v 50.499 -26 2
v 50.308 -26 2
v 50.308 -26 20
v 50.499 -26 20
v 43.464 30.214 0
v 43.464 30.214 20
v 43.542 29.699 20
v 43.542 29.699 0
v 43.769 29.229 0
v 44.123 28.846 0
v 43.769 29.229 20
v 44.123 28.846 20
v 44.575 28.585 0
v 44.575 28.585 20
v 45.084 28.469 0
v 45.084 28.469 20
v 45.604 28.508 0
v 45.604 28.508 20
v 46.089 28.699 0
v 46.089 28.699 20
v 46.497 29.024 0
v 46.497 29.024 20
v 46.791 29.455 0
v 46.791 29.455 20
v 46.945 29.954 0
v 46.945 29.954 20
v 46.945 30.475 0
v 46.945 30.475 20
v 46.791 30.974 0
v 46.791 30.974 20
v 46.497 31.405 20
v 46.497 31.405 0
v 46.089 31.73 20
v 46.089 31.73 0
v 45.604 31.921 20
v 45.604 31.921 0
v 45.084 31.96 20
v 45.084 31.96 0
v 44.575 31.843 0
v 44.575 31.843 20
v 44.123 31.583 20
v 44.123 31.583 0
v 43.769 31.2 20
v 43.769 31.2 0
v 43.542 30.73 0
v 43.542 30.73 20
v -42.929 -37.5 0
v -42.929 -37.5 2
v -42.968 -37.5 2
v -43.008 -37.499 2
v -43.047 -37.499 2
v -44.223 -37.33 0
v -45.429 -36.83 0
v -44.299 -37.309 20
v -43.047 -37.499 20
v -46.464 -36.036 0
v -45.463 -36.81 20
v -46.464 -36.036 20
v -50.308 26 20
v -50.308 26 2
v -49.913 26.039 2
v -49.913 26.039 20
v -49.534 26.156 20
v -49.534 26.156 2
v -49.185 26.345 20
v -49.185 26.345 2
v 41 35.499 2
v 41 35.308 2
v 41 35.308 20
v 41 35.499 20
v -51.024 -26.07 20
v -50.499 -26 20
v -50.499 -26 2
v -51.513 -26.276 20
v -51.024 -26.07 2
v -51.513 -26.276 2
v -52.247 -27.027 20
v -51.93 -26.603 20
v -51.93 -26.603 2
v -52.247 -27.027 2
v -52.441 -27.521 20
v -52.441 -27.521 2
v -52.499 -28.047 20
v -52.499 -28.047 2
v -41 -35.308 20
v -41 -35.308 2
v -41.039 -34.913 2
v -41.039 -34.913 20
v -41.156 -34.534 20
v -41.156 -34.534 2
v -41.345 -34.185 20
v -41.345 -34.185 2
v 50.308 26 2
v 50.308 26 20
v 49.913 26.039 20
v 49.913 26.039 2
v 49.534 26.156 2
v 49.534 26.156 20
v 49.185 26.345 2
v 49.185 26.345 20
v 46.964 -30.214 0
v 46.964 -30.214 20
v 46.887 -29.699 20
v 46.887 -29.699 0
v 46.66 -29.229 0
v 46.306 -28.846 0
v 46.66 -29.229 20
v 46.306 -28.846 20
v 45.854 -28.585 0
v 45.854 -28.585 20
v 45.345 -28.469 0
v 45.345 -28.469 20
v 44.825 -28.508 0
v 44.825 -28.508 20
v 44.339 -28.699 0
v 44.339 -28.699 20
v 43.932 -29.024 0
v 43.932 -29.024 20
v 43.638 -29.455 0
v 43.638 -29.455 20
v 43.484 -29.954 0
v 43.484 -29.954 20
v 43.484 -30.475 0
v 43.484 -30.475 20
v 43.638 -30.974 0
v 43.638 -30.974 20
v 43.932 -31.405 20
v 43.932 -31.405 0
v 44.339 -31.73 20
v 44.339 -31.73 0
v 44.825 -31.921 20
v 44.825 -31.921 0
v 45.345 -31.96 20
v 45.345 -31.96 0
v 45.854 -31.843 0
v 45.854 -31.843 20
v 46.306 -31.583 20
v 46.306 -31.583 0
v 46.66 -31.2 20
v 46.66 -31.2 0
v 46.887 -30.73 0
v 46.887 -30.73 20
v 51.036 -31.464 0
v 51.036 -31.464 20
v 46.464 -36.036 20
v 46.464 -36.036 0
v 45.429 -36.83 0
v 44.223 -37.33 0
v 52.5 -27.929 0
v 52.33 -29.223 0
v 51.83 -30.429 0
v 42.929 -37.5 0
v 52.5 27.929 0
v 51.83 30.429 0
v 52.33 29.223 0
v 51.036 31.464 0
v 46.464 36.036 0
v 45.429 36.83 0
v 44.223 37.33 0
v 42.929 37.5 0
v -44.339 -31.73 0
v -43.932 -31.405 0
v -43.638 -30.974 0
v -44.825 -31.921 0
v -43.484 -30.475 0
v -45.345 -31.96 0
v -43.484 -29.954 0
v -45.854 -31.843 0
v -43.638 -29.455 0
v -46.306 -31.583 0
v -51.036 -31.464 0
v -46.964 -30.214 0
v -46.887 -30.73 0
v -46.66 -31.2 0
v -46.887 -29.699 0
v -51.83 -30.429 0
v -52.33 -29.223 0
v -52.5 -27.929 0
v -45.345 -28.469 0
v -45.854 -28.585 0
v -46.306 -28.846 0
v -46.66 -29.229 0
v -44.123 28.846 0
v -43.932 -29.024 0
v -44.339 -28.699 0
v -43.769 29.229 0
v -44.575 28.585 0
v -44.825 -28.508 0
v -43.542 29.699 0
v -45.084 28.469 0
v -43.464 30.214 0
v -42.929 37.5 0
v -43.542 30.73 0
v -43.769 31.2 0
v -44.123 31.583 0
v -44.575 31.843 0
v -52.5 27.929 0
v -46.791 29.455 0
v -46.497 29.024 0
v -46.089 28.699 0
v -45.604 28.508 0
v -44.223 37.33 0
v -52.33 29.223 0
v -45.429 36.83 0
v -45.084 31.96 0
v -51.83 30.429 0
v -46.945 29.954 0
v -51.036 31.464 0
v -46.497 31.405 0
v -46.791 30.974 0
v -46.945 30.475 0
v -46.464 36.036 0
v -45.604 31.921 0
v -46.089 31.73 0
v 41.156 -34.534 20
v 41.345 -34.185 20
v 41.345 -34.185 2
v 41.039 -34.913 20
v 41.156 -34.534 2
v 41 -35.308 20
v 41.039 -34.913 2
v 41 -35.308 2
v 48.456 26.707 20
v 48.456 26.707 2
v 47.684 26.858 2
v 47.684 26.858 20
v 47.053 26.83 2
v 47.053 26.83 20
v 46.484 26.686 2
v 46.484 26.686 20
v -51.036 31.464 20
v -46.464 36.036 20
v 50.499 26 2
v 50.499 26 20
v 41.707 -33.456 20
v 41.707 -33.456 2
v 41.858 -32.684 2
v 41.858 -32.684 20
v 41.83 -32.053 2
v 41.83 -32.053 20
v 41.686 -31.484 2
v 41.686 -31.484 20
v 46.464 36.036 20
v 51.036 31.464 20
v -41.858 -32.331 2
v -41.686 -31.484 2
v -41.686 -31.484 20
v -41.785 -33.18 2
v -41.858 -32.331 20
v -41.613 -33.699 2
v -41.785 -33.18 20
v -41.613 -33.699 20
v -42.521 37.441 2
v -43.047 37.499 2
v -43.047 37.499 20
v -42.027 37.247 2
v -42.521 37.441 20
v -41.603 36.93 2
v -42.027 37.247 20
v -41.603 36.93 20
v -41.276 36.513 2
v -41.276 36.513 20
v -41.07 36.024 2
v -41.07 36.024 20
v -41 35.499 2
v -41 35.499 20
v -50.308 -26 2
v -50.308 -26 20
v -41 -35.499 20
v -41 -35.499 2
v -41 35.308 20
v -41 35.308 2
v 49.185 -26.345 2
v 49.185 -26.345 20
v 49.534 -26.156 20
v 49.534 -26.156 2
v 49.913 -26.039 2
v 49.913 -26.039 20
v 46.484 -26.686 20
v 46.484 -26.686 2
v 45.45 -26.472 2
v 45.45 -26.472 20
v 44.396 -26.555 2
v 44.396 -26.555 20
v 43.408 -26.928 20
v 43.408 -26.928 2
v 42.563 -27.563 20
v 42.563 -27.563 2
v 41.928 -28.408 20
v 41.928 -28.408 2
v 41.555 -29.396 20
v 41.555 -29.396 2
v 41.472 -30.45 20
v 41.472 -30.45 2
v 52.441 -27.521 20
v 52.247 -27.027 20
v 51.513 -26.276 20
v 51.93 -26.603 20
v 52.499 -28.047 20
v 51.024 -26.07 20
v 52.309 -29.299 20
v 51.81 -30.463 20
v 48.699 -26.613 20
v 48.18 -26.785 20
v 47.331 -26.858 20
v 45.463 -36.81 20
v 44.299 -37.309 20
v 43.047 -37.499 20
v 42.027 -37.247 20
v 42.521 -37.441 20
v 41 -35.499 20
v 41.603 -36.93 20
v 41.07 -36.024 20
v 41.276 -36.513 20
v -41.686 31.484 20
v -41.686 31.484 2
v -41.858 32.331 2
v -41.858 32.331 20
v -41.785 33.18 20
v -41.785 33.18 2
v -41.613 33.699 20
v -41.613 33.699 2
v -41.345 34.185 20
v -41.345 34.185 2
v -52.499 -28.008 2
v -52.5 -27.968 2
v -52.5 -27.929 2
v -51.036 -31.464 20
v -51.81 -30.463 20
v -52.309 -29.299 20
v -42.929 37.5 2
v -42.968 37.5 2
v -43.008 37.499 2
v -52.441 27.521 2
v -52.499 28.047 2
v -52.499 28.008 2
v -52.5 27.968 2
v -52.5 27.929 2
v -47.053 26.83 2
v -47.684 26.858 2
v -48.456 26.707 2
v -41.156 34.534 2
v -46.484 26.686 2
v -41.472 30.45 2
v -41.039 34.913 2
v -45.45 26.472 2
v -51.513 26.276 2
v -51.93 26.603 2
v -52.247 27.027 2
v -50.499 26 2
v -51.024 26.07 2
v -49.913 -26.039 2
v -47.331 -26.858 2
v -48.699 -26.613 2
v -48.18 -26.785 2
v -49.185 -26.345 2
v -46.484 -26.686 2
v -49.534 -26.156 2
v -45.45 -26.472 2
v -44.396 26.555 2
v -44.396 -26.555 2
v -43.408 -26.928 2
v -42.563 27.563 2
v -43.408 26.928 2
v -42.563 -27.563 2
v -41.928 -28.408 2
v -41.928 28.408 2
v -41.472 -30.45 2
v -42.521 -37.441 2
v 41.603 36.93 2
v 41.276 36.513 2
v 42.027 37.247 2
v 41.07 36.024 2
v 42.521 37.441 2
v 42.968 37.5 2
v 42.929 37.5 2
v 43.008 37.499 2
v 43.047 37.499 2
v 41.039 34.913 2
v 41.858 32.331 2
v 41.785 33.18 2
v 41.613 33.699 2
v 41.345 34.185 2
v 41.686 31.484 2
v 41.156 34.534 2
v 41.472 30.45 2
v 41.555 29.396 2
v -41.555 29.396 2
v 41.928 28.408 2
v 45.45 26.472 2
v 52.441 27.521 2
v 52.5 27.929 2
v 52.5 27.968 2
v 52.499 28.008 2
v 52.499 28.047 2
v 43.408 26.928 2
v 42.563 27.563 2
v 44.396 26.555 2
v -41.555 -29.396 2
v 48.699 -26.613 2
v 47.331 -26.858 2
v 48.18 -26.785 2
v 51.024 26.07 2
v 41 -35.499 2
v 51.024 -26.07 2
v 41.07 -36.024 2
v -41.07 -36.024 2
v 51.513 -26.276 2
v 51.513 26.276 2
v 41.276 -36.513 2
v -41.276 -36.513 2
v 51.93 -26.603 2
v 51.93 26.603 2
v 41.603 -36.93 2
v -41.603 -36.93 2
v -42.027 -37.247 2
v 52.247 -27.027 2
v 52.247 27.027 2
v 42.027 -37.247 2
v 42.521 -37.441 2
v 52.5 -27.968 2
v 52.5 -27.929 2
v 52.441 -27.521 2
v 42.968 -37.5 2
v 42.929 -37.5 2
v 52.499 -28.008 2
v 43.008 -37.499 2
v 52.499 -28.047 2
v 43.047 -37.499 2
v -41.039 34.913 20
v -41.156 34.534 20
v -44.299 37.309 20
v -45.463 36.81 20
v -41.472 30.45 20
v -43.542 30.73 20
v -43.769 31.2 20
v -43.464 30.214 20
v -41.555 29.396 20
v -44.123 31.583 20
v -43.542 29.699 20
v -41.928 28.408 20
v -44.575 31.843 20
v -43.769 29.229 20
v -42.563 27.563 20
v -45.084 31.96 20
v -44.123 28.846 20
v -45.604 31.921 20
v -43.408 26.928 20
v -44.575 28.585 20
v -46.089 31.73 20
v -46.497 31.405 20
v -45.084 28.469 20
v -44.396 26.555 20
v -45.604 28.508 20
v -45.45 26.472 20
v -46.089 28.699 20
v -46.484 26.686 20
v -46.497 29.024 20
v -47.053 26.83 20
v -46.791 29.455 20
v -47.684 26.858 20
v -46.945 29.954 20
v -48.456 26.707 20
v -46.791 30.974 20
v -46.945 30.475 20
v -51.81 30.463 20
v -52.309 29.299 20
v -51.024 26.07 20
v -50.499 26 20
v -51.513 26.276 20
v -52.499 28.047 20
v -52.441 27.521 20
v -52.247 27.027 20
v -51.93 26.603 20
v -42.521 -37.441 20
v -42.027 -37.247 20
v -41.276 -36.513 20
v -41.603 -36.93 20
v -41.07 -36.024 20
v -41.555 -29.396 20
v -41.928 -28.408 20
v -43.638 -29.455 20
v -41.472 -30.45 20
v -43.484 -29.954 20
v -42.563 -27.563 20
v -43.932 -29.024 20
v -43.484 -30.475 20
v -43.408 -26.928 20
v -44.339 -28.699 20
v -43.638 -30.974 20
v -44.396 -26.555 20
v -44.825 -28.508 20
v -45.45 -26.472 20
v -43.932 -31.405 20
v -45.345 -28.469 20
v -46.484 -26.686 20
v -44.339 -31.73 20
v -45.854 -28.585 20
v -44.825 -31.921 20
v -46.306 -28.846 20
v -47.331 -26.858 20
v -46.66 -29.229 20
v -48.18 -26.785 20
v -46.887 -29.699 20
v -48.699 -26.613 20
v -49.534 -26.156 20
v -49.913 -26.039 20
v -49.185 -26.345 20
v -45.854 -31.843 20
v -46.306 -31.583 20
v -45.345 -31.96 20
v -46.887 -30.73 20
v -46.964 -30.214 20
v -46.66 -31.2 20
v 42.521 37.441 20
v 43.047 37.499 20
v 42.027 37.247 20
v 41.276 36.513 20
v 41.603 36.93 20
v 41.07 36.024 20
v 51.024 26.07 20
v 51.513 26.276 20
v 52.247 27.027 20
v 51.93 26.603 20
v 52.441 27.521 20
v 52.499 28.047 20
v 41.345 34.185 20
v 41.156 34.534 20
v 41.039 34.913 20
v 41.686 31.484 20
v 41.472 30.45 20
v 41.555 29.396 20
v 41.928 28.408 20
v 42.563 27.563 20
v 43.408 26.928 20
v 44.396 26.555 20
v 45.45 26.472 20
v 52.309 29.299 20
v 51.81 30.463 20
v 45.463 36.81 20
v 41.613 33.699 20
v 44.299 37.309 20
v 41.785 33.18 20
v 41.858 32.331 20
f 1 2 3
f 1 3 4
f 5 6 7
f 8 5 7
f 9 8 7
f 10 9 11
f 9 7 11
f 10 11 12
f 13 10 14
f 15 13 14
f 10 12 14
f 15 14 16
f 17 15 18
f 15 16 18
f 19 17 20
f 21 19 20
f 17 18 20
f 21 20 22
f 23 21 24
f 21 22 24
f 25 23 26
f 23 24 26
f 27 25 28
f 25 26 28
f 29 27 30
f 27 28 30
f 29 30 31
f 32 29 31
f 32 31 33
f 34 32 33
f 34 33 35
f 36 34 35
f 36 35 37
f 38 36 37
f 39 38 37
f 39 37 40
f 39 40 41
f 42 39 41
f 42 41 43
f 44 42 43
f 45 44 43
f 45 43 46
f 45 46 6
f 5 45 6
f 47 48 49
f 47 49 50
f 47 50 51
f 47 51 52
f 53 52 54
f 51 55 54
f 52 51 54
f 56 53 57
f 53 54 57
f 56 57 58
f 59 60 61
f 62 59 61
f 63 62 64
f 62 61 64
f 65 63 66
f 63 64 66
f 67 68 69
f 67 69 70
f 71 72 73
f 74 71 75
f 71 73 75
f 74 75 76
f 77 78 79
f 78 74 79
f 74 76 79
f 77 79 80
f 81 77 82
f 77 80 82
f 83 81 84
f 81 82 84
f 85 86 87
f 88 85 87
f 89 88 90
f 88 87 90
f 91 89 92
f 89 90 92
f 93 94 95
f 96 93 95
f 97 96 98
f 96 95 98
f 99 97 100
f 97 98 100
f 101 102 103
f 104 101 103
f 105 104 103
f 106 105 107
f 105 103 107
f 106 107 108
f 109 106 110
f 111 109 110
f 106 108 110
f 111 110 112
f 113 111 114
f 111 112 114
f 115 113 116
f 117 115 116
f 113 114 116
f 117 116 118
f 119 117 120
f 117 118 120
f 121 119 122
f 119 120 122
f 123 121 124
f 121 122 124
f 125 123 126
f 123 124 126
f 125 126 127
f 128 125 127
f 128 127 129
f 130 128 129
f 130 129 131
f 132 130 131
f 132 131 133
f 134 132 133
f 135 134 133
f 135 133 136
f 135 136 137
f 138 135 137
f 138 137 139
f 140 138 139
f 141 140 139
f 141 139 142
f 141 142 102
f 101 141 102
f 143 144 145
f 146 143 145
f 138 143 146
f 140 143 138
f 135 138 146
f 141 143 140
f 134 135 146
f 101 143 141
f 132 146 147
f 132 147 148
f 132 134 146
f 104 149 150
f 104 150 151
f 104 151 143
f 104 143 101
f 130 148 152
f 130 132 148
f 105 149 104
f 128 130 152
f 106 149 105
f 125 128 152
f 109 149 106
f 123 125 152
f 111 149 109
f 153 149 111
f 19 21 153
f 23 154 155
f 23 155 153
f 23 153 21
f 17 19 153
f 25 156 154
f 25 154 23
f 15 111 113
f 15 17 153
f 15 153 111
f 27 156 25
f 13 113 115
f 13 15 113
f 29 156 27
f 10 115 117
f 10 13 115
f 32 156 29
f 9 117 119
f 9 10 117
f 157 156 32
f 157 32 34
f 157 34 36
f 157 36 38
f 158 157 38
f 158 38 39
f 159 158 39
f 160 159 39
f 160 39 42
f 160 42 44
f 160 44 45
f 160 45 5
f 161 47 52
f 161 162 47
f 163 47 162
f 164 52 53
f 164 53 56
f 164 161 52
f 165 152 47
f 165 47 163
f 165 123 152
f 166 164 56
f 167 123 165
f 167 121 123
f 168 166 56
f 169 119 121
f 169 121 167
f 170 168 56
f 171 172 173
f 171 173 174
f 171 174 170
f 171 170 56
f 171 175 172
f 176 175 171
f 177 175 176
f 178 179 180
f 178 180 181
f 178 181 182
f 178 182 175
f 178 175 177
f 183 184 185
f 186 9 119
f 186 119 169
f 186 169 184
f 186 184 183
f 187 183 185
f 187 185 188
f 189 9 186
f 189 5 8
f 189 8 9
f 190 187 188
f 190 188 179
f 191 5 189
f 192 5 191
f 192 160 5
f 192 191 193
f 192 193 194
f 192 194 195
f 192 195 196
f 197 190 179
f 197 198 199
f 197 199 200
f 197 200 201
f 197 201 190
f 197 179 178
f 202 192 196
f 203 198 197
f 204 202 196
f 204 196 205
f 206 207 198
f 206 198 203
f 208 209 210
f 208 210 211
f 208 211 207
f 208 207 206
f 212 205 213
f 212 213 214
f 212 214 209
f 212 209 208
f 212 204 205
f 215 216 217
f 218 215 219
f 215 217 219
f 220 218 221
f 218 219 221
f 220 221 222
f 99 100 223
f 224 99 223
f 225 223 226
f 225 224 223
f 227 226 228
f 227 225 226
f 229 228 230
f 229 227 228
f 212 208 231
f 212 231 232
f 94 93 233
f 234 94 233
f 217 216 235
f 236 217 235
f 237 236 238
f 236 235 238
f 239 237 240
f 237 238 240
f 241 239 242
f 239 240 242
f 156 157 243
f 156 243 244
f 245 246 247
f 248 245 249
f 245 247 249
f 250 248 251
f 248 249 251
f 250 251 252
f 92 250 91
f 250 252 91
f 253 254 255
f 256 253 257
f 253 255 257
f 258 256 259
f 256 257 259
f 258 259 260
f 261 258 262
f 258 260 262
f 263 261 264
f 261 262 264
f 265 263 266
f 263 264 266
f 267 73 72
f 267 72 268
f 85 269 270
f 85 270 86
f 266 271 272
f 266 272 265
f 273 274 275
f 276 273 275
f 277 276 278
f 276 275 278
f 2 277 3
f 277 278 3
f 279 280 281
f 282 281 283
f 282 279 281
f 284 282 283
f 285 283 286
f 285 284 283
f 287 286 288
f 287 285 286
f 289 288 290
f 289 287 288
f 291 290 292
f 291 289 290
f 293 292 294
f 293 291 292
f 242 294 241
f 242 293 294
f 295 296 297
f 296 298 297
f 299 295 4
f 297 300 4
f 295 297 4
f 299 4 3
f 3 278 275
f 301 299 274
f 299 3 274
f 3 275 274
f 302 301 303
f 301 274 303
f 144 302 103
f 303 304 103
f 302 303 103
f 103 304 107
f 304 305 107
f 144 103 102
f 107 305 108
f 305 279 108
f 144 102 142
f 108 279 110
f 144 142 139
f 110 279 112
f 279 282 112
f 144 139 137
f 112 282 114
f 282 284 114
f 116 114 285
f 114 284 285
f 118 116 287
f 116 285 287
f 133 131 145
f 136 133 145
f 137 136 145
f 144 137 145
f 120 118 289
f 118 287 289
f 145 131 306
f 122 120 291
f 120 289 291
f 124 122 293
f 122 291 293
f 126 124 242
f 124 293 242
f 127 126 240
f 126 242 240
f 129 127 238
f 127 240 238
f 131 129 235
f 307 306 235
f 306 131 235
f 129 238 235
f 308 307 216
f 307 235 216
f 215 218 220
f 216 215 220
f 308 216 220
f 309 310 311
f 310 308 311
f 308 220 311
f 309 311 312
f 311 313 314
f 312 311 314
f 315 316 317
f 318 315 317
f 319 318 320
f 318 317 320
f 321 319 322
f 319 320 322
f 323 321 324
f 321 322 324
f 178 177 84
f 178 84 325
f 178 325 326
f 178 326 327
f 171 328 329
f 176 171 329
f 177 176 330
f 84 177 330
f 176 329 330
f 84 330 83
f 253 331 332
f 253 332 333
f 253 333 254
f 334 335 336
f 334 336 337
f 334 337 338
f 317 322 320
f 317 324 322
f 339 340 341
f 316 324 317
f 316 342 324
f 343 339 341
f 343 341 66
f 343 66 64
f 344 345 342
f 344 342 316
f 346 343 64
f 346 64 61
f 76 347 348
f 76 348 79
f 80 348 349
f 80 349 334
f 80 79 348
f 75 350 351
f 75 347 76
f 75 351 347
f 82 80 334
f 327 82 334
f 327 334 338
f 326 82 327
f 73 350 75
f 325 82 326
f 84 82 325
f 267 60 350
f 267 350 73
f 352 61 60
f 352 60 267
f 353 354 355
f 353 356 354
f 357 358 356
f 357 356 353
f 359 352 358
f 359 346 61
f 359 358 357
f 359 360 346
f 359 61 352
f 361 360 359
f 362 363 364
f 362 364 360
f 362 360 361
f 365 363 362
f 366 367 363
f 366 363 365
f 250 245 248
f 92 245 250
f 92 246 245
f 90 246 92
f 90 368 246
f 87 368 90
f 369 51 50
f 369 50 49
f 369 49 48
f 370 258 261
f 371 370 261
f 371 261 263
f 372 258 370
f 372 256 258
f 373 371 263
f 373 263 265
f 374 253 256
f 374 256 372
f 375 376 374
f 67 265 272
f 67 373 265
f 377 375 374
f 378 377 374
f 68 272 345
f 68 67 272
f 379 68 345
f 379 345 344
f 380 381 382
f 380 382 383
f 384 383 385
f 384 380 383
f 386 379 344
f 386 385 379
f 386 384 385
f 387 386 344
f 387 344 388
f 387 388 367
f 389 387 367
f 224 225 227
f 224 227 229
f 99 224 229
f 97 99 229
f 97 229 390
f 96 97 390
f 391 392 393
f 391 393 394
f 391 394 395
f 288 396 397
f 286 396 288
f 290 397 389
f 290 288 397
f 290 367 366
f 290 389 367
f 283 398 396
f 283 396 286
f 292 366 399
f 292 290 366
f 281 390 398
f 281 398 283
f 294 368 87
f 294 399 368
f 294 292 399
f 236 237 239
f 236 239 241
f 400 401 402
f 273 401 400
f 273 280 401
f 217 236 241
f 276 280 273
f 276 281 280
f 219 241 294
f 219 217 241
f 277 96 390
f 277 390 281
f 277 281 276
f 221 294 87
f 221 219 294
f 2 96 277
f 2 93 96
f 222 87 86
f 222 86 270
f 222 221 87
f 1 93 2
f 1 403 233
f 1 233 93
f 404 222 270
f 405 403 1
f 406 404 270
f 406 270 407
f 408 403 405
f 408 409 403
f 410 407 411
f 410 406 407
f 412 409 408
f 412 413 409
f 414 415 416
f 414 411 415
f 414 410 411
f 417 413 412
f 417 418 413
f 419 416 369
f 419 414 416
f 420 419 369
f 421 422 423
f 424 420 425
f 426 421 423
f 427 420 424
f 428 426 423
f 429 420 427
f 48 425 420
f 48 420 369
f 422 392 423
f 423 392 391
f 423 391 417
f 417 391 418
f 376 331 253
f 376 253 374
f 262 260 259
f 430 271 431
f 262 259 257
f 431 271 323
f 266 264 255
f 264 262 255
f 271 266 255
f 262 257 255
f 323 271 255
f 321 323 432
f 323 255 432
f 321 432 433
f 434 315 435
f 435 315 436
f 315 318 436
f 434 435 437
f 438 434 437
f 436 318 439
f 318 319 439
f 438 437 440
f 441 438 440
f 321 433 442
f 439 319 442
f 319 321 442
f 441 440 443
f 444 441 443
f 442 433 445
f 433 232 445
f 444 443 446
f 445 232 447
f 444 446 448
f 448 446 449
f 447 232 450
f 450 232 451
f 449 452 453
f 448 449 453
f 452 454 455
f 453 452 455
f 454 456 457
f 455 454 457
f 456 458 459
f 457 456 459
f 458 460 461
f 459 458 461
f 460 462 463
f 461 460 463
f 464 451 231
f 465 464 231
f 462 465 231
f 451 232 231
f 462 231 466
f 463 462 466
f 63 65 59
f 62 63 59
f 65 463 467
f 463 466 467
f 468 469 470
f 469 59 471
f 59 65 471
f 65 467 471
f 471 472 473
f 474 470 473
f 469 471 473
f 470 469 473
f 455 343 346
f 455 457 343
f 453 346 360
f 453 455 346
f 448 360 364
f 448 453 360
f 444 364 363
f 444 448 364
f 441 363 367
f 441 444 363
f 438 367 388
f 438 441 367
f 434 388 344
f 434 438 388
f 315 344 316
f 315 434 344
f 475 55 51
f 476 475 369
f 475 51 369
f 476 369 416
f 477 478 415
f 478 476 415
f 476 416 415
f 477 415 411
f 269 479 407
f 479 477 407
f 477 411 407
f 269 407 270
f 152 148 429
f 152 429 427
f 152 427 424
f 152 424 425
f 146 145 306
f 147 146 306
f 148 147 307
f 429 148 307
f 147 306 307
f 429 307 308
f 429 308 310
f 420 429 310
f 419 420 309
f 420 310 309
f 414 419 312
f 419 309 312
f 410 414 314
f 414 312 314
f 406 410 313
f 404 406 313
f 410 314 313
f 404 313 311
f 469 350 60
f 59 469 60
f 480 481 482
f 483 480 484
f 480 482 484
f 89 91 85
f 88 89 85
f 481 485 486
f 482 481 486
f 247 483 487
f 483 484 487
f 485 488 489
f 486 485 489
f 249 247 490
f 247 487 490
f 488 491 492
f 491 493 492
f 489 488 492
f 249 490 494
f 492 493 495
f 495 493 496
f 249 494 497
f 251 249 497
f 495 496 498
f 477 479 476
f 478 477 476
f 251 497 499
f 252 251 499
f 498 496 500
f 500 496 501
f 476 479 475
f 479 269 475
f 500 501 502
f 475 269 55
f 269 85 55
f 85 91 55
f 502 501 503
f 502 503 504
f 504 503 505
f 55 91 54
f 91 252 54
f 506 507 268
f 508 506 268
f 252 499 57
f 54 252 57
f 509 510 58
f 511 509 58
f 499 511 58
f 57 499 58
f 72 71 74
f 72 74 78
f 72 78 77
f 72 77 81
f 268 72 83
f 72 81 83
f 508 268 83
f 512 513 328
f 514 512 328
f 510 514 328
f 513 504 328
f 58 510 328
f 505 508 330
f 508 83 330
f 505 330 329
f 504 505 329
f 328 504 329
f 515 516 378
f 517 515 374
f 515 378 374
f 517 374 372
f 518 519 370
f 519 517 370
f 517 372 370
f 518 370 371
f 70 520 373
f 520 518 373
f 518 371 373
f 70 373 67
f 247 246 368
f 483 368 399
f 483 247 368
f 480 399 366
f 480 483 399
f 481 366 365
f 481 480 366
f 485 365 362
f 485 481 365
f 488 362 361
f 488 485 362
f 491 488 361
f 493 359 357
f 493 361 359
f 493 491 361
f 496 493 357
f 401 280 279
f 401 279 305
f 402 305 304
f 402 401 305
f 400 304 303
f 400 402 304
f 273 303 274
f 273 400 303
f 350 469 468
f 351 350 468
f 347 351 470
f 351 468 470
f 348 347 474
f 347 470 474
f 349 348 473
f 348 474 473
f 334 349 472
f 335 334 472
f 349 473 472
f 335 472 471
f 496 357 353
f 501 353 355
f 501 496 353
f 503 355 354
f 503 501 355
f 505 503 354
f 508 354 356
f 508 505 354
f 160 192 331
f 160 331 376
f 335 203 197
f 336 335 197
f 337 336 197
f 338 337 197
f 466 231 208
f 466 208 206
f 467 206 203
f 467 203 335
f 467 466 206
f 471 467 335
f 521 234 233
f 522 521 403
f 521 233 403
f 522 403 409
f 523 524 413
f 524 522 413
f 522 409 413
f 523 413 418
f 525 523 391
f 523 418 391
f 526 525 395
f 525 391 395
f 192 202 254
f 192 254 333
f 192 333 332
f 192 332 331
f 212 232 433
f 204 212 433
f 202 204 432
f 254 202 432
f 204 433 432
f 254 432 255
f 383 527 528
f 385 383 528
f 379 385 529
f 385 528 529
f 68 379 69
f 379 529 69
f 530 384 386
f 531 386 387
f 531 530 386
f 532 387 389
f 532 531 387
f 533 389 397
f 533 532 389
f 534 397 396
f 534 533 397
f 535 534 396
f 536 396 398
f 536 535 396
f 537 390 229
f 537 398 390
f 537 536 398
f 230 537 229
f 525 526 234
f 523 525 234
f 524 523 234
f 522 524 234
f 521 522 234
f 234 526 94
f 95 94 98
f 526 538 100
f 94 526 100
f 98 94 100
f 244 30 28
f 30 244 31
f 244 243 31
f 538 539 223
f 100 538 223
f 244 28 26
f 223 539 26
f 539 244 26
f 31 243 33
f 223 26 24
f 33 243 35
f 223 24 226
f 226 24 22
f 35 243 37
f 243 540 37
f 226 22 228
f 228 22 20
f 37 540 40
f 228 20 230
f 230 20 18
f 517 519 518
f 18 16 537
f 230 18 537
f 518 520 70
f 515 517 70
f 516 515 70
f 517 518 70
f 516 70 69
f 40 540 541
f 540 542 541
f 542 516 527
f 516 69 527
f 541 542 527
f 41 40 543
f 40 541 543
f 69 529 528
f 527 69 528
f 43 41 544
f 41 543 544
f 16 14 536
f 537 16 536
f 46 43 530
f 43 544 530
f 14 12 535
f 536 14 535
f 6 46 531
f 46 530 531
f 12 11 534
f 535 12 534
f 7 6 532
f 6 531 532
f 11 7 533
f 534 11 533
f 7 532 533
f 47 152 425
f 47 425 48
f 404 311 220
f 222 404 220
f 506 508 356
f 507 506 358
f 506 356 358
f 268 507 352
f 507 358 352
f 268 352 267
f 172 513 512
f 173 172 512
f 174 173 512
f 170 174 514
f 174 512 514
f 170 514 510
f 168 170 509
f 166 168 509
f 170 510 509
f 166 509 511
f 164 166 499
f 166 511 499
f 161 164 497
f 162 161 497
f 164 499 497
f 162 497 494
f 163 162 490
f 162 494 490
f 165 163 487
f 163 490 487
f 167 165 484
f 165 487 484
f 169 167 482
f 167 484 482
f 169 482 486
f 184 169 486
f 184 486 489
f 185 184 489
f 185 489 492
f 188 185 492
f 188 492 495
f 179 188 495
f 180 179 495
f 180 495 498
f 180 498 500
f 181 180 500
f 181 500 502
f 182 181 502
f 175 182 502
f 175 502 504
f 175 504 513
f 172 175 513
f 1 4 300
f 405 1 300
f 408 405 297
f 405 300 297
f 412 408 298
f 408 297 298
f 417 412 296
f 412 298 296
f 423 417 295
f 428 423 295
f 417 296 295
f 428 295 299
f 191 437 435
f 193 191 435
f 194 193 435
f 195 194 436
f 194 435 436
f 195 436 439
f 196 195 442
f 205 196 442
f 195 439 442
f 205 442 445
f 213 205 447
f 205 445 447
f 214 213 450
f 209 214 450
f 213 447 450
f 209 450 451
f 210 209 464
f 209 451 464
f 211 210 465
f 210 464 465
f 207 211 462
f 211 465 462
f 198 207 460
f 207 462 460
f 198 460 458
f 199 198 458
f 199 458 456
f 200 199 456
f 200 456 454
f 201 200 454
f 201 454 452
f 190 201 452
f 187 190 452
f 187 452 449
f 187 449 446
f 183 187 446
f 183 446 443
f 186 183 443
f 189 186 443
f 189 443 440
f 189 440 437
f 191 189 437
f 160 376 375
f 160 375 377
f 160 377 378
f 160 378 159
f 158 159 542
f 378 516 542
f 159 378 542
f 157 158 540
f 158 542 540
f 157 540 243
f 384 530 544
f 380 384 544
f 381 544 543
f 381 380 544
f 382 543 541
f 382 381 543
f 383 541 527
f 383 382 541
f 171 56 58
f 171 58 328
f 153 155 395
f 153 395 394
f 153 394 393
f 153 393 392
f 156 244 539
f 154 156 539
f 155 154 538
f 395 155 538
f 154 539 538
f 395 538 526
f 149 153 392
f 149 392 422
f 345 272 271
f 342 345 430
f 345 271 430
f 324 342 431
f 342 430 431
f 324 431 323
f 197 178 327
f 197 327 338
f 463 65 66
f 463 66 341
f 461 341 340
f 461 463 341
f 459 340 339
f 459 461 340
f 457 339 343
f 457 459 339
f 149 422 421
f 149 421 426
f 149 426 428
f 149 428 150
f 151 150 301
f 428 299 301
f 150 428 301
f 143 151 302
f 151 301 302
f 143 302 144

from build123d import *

# Parameters (mm, degrees)
EXTRUDE_1_DEPTH     = 20
SKETCH_2_R          = 1.75
CUT_EXTRUDE_1_DEPTH = 34
SHELL_1_T           = -2
FILLET_1_R          = 10
FILLET_2_R          = 3
FILLET_3_R          = 5
SKETCH_4_W          = 82
SKETCH_4_H          = 126.745531776
CUT_EXTRUDE_2_DEPTH = 18
FILLET_4_R          = 2
CUT_EXTRUDE_START   = -18
SKETCH_5_W          = 173.89587329
SKETCH_5_H          = 52
CUT_EXTRUDE_3_DEPTH = 18
FILLET_5_R          = 2


with BuildPart() as part:
    # Эскиз1 → Бобышка-Вытянуть1 (new body)
    with BuildSketch(Plane.XY):
        Polygon((-52.5, 30), (-45, 37.5), (45, 37.5), (52.5, 30), (52.5, -30), (45, -37.5), (-45, -37.5), (-52.5, -30), align=None)
    extrude(amount=EXTRUDE_1_DEPTH)

    # Эскиз2 → Вырез-Вытянуть1 (cut)
    with BuildSketch(Plane.XY.offset(20)):
        with Locations((-45.214466094, 30.214466094)):
            Circle(SKETCH_2_R)
        with Locations(Location((45.214466094, 30.214466094, 0), (0, 0, 180))):
            Circle(SKETCH_2_R)
        with Locations((45.214466094, -30.214466094)):
            Circle(SKETCH_2_R)
        with Locations(Location((-45.214466094, -30.214466094, 0), (0, 0, 180))):
            Circle(SKETCH_2_R)
    extrude(amount=-CUT_EXTRUDE_1_DEPTH, mode=Mode.SUBTRACT)

    # Оболочка1
    shell_1_openings = [part.faces().sort_by_distance(p)[0] for p in [
        (0, 0, 20),
    ]]
    offset(amount=SHELL_1_T, openings=shell_1_openings, kind=Kind.INTERSECTION)

    # Скругление1
    # the kernel refuses this fillet: 10 mm, written as the material it adds along each edge
    with BuildSketch(Plane(origin=(-45.74479618, -33.926776695, 2), x_dir=(0.7071067811865442, -0.7071067811865507, 0), z_dir=(0, 0, 1)), Plane(origin=(48.926776695, -30.74479618, 2), x_dir=(0.7071067811865482, 0.7071067811865467, 0), z_dir=(0, 0, 1)), Plane(origin=(45.74479618, 33.926776695, 2), x_dir=(-0.707106781186546, 0.7071067811865492, 0), z_dir=(0, 0, 1)), Plane(origin=(-48.926776695, 30.74479618, 2), x_dir=(-0.7071067811865508, -0.7071067811865444, 0), z_dir=(0, 0, 1))) as fillet_1_piece_1:
        with BuildLine():
            CenterArc((11.477032042, 3.794412555), FILLET_1_R, 183.312134334, 18.986942704)
            Line((1.493736012, 3.21665797), (1.294070091, 3.205102878))
            ThreePointArc((1.294070091, 3.205102878), (0.969771845, 1.504817982), (-0.12, 0.16))
            Line((-0.12, 0.16), (0, -0.2))
            ThreePointArc((0, -0.2), (1.112436867, -0.2), (2.039830568, -0.075888251))
            Line((2.039830568, -0.075888251), (2.224873734, 0))
        make_face()
    extrude(amount=18)
    with BuildSketch(Plane(origin=(-48.926776695, -30.74479618, 2), x_dir=(0.34351243985929386, 0.9391481265816991, 0), z_dir=(0, 0, 1)), Plane(origin=(45.74479618, -33.926776695, 2), x_dir=(-0.9391481265817004, 0.34351243985929, 0), z_dir=(0, 0, 1)), Plane(origin=(48.926776695, 30.74479618, 2), x_dir=(-0.3435124398592874, -0.9391481265817014, 0), z_dir=(0, 0, 1)), Plane(origin=(-45.74479618, 33.926776695, 2), x_dir=(0.9391481265817011, -0.34351243985928803, 0), z_dir=(0, 0, 1))) as fillet_1_piece_2:
        with BuildLine():
            CenterArc((8.275322434, 8.811292173), FILLET_1_R, 222.791938952, 18.986942704)
            Line((0.937067943, 2.017911495), (0.790302854, 1.882043882))
            ThreePointArc((0.790302854, 1.882043882), (0.287138375, 1.093191354), (-0.181395597, 0.084235607))
            Line((-0.181395597, 0.084235607), (0.094575114, -0.176225843))
            ThreePointArc((0.094575114, -0.176225843), (1.773283379, 0.245765435), (3.451991644, -0.176225843))
            Line((3.451991644, -0.176225843), (3.546566758, 0))
        make_face()
    extrude(amount=18)

    # Скругление2
    fillet_2_edges = [part.edges().sort_by_distance(p)[0] for p in [
        (-50.5, 29.171572875, 11),
        (-44.171572875, 35.5, 11),
        (-44.171572875, -35.5, 11),
        (-50.5, -29.171572875, 11),
        (44.171572875, -35.5, 11),
        (50.5, -29.171572875, 11),
        (50.5, 29.171572875, 11),
        (44.171572875, 35.5, 11),
    ]]
    fillet(fillet_2_edges, radius=FILLET_2_R)

    # Скругление3
    fillet_3_edges = [part.edges().sort_by_distance(p)[0] for p in [
        (45, 37.5, 10),
        (52.5, 30, 10),
        (52.5, -30, 10),
        (45, -37.5, 10),
        (-45, -37.5, 10),
        (-52.5, -30, 10),
        (-52.5, 30, 10),
        (-45, 37.5, 10),
    ]]
    fillet(fillet_3_edges, radius=FILLET_3_R)

    # Эскиз4 → Вырез-Вытянуть2 (cut)
    with BuildSketch(Plane.XY.offset(20)):
        Rectangle(SKETCH_4_W, SKETCH_4_H)
    extrude(amount=-CUT_EXTRUDE_2_DEPTH, mode=Mode.SUBTRACT)

    # Скругление4
    # the kernel refuses this fillet: 2 mm, written as the material it takes off along each edge
    with BuildSketch(Plane(origin=(41, -34.605706623, 2), x_dir=(0, -1, 0), z_dir=(0, 0, 1)), Plane(origin=(41, 34.605706623, 21.756559814), x_dir=(0, 1, 0), z_dir=(0, 0, -1))) as fillet_4_piece_1:
        with BuildLine():
            CenterArc((0.702623926, 2), FILLET_4_R, 235.828901177, 34.171098823)
            ThreePointArc((-0.420708294, 0.345272009), (-0.20250821, 0.18219615), (0, 0))
            Line((0, 0), (0.702623926, 0))
        make_face()
    extrude(amount=19.756559814, mode=Mode.SUBTRACT)
    with BuildSketch(Plane(origin=(41, -37.5, 25.118447555), x_dir=(0.9999997651545144, 0.0006853400003404547, 0), z_dir=(0, 0, -1)), Plane(origin=(-41, -37.5, 2), x_dir=(-0.9999997651545144, 0.0006853400003439418, 0), z_dir=(0, 0, 1)), Plane(origin=(41, 37.5, 2), x_dir=(0.9999997651545144, -0.0006853400003439394, 0), z_dir=(0, 0, 1))) as fillet_4_piece_2:
        with BuildLine():
            CenterArc((2.001370787, -1.999470741), FILLET_4_R, 88.681844886, 91.357422207)
            Line((0.001371257, -2.000841421), (-0.198628696, -2.000978489))
            Line((-0.198628696, -2.000978489), (-0.199999953, -0.000137068))
            Line((-0.199999953, -0.000137068), (-0.000137068, 0.199999953))
            ThreePointArc((-0.000137068, 0.199999953), (1.928794667, 0.201321927), (2.051979846, 0.199947074))
            Line((2.051979846, 0.199947074), (2.047379022, 0))
        make_face()
    extrude(amount=23.118447555, mode=Mode.SUBTRACT)
    with BuildSketch(Plane(origin=(-41, -34.605706623, 2), x_dir=(0, -1, 0), z_dir=(0, 0, 1))) as fillet_4_piece_3:
        with BuildLine():
            CenterArc((0.702623926, -2), FILLET_4_R, 90, 34.171098823)
            ThreePointArc((-0.420708294, -0.345272009), (-0.20250821, -0.18219615), (0, 0))
            Line((0, 0), (0.702623926, 0))
        make_face()
    extrude(amount=19.756559814, mode=Mode.SUBTRACT)
    with BuildSketch(Plane(origin=(-41, 34.605706623, 21.756559814), x_dir=(-0.6343994710236062, -0.7730053758965514, 0), z_dir=(0, 0, -1))) as fillet_4_piece_4:
        with BuildLine():
            CenterArc((0.72566687, 1.991754999), FILLET_4_R, 230.624541426, 34.171098823)
            Line((-0.543132072, 0.445744247), (0, 0))
            ThreePointArc((0, 0), (0.272125076, 0.012367502), (0.544250153, 0))
        make_face()
    extrude(amount=19.756559814, mode=Mode.SUBTRACT)
    with BuildSketch(Plane(origin=(-41, 37.5, 25.118447555), x_dir=(0, -1, 0), z_dir=(0, 0, -1))) as fillet_4_piece_5:
        with BuildLine():
            CenterArc((2.00084189, 2), FILLET_4_R, 178.642577793, 91.357422207)
            Line((0.001403151, 2.047378541), (-0.198540723, 2.052116395))
            ThreePointArc((-0.198540723, 2.052116395), (-0.2, 1.928932188), (-0.2, 0))
            Line((-0.2, 0), (0, -0.2))
            Line((0, -0.2), (2.00084189, -0.2))
            Line((2.00084189, -0.2), (2.00084189, 0))
        make_face()
    extrude(amount=23.118447555, mode=Mode.SUBTRACT)

    # Эскиз5 → Вырез-Вытянуть3 (cut)
    with BuildSketch(Plane.XY.offset(20).offset(CUT_EXTRUDE_START)):
        Rectangle(SKETCH_5_W, SKETCH_5_H)
    extrude(amount=CUT_EXTRUDE_3_DEPTH, mode=Mode.SUBTRACT)

    # Скругление5
    # the kernel refuses this fillet: 2 mm, written as the material it takes off along each edge
    with BuildSketch(Plane(origin=(49.605706623, -26, 21.756559814), x_dir=(1, 0, 0), z_dir=(0, 0, -1)), Plane(origin=(-49.605706623, -26, 2), x_dir=(-1, 0, 0), z_dir=(0, 0, 1))) as fillet_5_piece_1:
        with BuildLine():
            CenterArc((0.702623926, 2), FILLET_5_R, 235.828901177, 34.171098823)
            ThreePointArc((-0.420708294, 0.345272009), (-0.20250821, 0.18219615), (0, 0))
            Line((0, 0), (0.702623926, 0))
        make_face()
    extrude(amount=19.756559814, mode=Mode.SUBTRACT)
    with BuildSketch(Plane(origin=(52.5, -26, 25.118447555), x_dir=(-0.0006853400003439216, -0.9999997651545144, 0), z_dir=(0, 0, -1)), Plane(origin=(52.5, 26, 2), x_dir=(-0.0006853400003439287, 0.9999997651545144, 0), z_dir=(0, 0, 1)), Plane(origin=(-52.5, -26, 2), x_dir=(0.0006853400003439322, -0.9999997651545144, 0), z_dir=(0, 0, 1)), Plane(origin=(-52.5, 26, 25.118447555), x_dir=(0.0006853400003439264, 0.9999997651545144, 0), z_dir=(0, 0, -1))) as fillet_5_piece_2:
        with BuildLine():
            CenterArc((2.001370787, 1.999470741), FILLET_5_R, 179.960732907, 91.357422207)
            Line((0.001371257, 2.000841421), (-0.198628696, 2.000978489))
            Line((-0.198628696, 2.000978489), (-0.199999953, 0.000137068))
            Line((-0.199999953, 0.000137068), (-0.000137068, -0.199999953))
            ThreePointArc((-0.000137068, -0.199999953), (1.928794667, -0.201321927), (2.051979846, -0.199947074))
            Line((2.051979846, -0.199947074), (2.047379022, 0))
        make_face()
    extrude(amount=23.118447555, mode=Mode.SUBTRACT)
    with BuildSketch(Plane(origin=(49.605706623, 26, 21.756559814), x_dir=(-0.7730053758965525, 0.6343994710236047, 1.8308445150644594e-15), z_dir=(0, 0, -1))) as fillet_5_piece_3:
        with BuildLine():
            CenterArc((0.72566687, 1.991754999), FILLET_5_R, 230.624541426, 34.171098823)
            Line((-0.543132072, 0.445744247), (0, 0))
            ThreePointArc((0, 0), (0.272125076, 0.012367502), (0.544250153, 0))
        make_face()
    extrude(amount=19.756559814, mode=Mode.SUBTRACT)
    with BuildSketch(Plane(origin=(-49.605706623, 26, 2), x_dir=(-1, 0, 0), z_dir=(0, 0, 1))) as fillet_5_piece_4:
        with BuildLine():
            CenterArc((0.702623926, -2), FILLET_5_R, 90, 34.171098823)
            ThreePointArc((-0.420708294, -0.345272009), (-0.20250821, -0.18219615), (0, 0))
            Line((0, 0), (0.702623926, 0))
        make_face()
    extrude(amount=19.756559814, mode=Mode.SUBTRACT)


solid = part.part
